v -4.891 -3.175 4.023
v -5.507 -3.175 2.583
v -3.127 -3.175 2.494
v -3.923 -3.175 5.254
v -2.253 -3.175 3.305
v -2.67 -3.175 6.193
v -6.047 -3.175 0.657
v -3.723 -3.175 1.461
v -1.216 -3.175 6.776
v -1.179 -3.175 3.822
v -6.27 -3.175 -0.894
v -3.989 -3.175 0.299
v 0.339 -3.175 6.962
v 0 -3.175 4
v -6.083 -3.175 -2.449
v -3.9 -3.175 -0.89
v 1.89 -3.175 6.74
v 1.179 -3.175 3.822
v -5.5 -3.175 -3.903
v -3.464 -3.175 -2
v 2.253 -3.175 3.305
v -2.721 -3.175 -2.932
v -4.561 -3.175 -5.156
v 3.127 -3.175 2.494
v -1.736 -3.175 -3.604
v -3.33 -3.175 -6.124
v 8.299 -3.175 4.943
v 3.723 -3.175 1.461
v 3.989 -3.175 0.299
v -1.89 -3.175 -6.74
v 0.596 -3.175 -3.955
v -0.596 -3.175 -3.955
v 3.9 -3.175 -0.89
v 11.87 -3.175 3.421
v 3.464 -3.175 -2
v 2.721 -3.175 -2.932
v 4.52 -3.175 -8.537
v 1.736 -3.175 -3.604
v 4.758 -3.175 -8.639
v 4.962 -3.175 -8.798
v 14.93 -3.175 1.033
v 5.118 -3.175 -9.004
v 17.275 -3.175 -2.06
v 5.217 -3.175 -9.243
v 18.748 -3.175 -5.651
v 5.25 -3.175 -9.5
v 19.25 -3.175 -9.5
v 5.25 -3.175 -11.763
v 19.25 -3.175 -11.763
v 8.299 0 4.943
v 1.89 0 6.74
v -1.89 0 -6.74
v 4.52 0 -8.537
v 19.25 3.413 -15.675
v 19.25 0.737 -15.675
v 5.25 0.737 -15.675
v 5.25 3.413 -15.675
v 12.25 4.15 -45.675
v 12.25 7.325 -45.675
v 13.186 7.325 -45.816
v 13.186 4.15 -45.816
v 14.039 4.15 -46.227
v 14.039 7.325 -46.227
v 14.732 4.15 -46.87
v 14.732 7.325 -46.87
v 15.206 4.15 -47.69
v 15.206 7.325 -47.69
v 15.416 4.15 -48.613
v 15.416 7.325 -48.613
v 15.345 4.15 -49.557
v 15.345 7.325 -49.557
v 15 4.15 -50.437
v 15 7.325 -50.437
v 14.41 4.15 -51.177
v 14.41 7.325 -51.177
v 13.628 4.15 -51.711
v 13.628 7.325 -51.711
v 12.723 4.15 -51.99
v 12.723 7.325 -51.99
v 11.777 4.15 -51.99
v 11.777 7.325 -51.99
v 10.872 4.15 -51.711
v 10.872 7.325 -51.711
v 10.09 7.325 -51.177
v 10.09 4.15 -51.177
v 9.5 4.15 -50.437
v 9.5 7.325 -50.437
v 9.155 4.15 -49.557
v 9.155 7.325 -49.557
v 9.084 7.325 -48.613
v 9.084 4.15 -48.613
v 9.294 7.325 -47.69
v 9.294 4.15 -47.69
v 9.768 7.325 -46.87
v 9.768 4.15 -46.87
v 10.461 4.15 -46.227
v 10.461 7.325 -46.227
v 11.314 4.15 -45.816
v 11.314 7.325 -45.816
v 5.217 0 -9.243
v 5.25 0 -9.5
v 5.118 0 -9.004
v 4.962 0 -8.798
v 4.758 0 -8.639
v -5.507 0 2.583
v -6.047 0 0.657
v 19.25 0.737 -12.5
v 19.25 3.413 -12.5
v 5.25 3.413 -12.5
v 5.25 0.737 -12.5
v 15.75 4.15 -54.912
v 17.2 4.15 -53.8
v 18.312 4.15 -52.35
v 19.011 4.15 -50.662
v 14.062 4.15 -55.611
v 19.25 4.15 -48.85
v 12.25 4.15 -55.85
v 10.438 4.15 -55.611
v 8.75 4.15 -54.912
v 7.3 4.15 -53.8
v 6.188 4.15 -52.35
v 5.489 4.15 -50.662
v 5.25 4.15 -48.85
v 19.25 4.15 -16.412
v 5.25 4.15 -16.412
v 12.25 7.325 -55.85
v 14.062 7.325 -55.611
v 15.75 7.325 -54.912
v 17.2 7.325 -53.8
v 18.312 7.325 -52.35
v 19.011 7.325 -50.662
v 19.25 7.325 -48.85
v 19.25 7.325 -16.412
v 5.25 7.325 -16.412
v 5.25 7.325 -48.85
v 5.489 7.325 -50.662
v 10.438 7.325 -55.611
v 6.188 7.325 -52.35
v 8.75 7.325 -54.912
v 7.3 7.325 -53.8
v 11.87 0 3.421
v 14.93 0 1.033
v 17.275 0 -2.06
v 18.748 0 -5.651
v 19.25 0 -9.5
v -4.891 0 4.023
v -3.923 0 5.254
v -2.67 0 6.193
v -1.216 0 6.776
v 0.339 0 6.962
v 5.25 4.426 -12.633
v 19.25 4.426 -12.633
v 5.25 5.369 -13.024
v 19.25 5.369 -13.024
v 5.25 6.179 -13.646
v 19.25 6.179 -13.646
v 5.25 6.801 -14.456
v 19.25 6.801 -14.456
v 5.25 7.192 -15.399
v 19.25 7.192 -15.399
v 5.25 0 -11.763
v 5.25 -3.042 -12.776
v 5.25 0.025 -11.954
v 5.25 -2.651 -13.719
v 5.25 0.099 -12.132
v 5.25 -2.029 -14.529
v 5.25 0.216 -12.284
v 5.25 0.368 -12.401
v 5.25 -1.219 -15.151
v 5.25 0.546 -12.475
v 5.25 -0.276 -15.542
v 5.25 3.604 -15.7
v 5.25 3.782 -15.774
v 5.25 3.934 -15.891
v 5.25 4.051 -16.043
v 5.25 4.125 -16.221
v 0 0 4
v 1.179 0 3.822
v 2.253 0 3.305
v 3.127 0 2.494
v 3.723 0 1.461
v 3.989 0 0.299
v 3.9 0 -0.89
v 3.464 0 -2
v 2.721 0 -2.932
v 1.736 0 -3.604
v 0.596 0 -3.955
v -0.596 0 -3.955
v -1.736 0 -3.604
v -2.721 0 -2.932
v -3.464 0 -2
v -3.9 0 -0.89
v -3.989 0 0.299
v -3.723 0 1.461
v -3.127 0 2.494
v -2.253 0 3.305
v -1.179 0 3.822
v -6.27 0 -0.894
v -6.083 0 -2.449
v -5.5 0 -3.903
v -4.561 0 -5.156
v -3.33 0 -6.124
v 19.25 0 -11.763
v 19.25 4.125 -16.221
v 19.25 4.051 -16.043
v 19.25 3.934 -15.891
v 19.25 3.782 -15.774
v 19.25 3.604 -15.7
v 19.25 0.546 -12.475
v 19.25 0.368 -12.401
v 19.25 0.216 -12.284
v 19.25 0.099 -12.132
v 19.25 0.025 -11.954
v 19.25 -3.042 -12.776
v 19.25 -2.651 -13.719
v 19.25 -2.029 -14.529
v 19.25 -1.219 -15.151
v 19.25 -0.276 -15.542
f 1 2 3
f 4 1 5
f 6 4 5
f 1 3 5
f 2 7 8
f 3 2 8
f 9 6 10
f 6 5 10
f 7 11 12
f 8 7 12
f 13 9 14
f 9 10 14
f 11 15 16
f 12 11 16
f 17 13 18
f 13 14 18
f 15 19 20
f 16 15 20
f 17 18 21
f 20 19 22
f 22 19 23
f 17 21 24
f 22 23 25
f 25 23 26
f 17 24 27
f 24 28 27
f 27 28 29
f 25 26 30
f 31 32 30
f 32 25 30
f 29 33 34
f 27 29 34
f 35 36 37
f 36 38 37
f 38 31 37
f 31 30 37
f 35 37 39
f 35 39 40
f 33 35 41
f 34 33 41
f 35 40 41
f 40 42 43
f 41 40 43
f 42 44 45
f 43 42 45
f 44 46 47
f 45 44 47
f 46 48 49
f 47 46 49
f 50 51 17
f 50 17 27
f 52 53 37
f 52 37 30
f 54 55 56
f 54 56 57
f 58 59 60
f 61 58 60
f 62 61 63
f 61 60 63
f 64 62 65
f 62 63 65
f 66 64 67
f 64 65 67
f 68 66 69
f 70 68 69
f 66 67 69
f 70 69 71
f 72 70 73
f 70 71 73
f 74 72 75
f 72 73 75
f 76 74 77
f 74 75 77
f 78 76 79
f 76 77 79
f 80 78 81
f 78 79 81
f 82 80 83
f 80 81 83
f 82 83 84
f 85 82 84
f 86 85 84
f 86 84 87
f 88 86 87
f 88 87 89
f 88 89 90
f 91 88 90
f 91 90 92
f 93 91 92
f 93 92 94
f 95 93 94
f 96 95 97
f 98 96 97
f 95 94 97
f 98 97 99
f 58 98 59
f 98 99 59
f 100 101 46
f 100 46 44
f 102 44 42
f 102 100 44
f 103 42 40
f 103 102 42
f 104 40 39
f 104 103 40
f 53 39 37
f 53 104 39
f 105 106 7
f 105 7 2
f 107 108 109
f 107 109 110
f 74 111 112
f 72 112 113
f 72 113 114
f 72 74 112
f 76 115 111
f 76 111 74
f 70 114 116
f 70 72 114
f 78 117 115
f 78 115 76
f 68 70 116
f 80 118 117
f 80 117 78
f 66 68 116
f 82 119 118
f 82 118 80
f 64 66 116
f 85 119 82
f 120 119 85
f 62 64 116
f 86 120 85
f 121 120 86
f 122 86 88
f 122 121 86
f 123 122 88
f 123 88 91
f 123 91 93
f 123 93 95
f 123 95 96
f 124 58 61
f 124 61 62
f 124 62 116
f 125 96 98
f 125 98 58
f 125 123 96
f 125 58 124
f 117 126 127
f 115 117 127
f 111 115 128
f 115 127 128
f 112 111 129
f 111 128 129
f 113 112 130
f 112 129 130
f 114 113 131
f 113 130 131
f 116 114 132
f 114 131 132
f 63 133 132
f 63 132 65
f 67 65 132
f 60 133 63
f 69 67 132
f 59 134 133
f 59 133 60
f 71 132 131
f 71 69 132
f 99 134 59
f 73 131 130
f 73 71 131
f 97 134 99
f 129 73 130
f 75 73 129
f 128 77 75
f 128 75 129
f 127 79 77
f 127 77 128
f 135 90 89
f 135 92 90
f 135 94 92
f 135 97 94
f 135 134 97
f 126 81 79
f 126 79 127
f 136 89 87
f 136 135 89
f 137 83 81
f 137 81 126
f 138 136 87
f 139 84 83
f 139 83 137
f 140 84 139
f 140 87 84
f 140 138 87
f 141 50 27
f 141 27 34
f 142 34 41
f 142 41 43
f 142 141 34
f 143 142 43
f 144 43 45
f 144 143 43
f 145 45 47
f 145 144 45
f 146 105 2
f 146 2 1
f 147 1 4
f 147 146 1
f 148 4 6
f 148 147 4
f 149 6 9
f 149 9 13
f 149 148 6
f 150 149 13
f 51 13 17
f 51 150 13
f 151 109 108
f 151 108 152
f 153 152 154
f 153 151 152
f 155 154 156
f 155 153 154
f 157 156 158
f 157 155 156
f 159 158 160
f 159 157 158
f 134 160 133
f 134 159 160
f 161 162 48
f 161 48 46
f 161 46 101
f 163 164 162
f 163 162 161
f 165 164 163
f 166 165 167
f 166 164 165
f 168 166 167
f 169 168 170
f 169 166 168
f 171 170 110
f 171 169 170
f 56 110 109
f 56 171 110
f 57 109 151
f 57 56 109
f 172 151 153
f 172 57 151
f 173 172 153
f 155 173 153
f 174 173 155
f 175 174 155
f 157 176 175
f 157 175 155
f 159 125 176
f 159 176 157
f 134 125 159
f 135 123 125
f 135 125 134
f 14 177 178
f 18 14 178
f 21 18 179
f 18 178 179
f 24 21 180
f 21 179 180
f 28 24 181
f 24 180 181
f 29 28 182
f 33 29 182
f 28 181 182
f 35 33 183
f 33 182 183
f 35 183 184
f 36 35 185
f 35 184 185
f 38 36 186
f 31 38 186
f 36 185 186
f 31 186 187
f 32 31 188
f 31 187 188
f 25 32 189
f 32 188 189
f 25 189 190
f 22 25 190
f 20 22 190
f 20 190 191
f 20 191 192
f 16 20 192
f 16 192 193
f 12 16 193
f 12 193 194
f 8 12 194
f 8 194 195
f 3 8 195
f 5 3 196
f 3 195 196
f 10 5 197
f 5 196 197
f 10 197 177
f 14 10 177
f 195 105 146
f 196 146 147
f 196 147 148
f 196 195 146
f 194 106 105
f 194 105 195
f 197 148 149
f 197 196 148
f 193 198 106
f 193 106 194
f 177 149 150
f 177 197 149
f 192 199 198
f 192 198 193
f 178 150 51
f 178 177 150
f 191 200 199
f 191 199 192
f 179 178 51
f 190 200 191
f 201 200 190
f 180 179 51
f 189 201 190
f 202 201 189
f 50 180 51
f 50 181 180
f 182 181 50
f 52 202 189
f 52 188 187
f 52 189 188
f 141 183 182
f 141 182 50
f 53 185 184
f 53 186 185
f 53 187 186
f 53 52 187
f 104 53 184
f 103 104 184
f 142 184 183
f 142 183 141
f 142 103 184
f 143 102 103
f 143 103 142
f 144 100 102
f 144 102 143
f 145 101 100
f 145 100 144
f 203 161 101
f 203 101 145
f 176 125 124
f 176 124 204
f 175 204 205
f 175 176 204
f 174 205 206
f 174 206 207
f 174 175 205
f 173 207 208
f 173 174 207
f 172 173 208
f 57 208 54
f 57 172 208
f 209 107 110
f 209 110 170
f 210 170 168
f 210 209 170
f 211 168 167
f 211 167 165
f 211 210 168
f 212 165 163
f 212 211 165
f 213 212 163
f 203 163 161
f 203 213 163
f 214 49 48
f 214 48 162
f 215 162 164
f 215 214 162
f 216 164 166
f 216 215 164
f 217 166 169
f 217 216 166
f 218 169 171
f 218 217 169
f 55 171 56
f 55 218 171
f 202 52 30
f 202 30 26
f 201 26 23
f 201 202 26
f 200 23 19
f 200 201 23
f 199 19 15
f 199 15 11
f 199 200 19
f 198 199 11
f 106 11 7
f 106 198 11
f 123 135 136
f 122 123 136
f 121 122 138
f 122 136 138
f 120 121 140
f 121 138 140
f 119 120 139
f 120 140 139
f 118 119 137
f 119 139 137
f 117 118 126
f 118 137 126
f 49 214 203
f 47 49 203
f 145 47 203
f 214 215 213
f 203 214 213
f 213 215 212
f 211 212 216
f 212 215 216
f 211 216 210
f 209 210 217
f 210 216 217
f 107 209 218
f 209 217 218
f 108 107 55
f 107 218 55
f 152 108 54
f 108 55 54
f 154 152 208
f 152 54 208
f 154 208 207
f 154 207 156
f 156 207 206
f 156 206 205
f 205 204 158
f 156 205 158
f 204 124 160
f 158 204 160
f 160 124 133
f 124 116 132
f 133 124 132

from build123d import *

# Parameters (mm, degrees)
SKETCH1_R                    = 4
BASE_FLANGE1_DEPTH           = 3.175
EDGE_FLANGE1_STRIP_W         = 14.1732
EDGE_FLANGE1_STRIP_H         = 3.175
EDGE_FLANGE1_STRIP_CUT_DEPTH = 14
EDGE_FLANGE1_DEPTH           = 14
EDGE_FLANGE2_STRIP_W         = 14.1732
EDGE_FLANGE2_STRIP_H         = 3.175
EDGE_FLANGE2_STRIP_CUT_DEPTH = 14
EDGE_FLANGE2_DEPTH           = 14
SKETCH17_R                   = 3.175
CUT_EXTRUDE1_DEPTH           = 3.175


# Sheet-metal steps are written as plain solids
with BuildPart() as part:
    # Sketch1 → Base-Flange1 (new body)
    with BuildSketch(Plane(origin=(0, 0, 0), x_dir=(1, 0, 0), z_dir=(0, 1, 0))):
        with BuildLine():
            Line((19.250001318, 12.5), (5.250001318, 12.5))
            Line((5.250001318, 12.5), (5.250001318, 9.5))
            ThreePointArc((5.250001318, 9.5), (5.046855339, 8.895828112), (4.519953978, 8.537126404))
            Line((4.519953978, 8.537126404), (-1.889668619, 6.740115171))
            ThreePointArc((-1.889668619, 6.740115171), (-5.500391492, 3.902688152), (-6.047194235, -0.656842363))
            Line((-6.047194235, -0.656842363), (-5.507288915, -2.582589555))
            ThreePointArc((-5.507288915, -2.582589555), (-2.669861896, -6.193312428), (1.889668619, -6.740115171))
            Line((1.889668619, -6.740115171), (8.299291215, -4.943103937))
            ThreePointArc((8.299291215, -4.943103937), (16.202811625, 0.437421682), (19.250001318, 9.5))
            Line((19.250001318, 9.5), (19.250001318, 12.5))
        make_face()
        with Locations(Location((0, 0, 0), (0, 0, 270))):
            Circle(SKETCH1_R, mode=Mode.SUBTRACT)
    extrude(amount=-BASE_FLANGE1_DEPTH)

    # Edge-Flange1 strip (across the edge) → Edge-Flange1 strip cut (cut)
    with BuildSketch(Plane(origin=(19.250001318, 0, -12.5), x_dir=(0, 0, 1), z_dir=(-1, 0, 0))):
        with Locations((-6.35, -1.5875)):
            Rectangle(EDGE_FLANGE1_STRIP_W, EDGE_FLANGE1_STRIP_H)
    extrude(amount=EDGE_FLANGE1_STRIP_CUT_DEPTH, mode=Mode.SUBTRACT)

    # Edge-Flange1 section (across the edge) → Edge-Flange1 (add)
    with BuildSketch(Plane(origin=(19.250001318, 0, -12.5), x_dir=(0, 0, 1), z_dir=(-1, 0, 0))):
        with BuildLine():
            Line((-3.175, 0.7366), (-3.175, 7.324994814))
            Line((-3.175, 7.324994814), (0, 7.324994814))
            Line((0, 7.324994814), (0, 0.7366))
            ThreePointArc((0, 0.7366), (0.215745145, 0.215745145), (0.7366, 0))
            Line((0.7366, 0), (0.7366, -3.175))
            ThreePointArc((0.7366, -3.175), (-2.029318885, -2.029318885), (-3.175, 0.7366))
        make_face()
    extrude(amount=EDGE_FLANGE1_DEPTH)

    # Edge-Flange2 strip (across the edge) → Edge-Flange2 strip cut (cut)
    with BuildSketch(Plane(origin=(5.250001318, 7.324994814, -15.675), x_dir=(0, -1, 0), z_dir=(1, 0, 0))):
        with Locations((-3.175, -1.5875)):
            Rectangle(EDGE_FLANGE2_STRIP_W, EDGE_FLANGE2_STRIP_H)
    extrude(amount=EDGE_FLANGE2_STRIP_CUT_DEPTH, mode=Mode.SUBTRACT)

    # Edge-Flange2 section (across the edge) → Edge-Flange2 (add)
    with BuildSketch(Plane(origin=(5.250001318, 7.324994814, -15.675), x_dir=(0, -1, 0), z_dir=(1, 0, 0))):
        with BuildLine():
            Line((0, 0.7366), (0, 40.174998631))
            Line((0, 40.174998631), (3.175, 40.174998631))
            Line((3.175, 40.174998631), (3.175, 0.7366))
            ThreePointArc((3.175, 0.7366), (3.390745145, 0.215745145), (3.9116, 0))
            Line((3.9116, 0), (3.9116, -3.175))
            ThreePointArc((3.9116, -3.175), (1.145681115, -2.029318885), (0, 0.7366))
        make_face()
    extrude(amount=EDGE_FLANGE2_DEPTH)

    # Sketch17 → Cut-Extrude1 (cut)
    with BuildSketch(Plane(origin=(0, 7.324994814, 0), x_dir=(1, 0, 0), z_dir=(0, 1, 0))):
        with BuildLine():
            ThreePointArc((5.250001318, 48.849998631), (7.30025385, 53.7997461), (12.250001318, 55.849998631))
            Line((12.250001318, 55.849998631), (5.250001318, 55.849998631))
            Line((5.250001318, 55.849998631), (5.250001318, 48.849998631))
        make_face()
        with BuildLine():
            ThreePointArc((12.250001318, 55.849998631), (17.199748787, 53.7997461), (19.250001318, 48.849998631))
            Line((19.250001318, 48.849998631), (19.250001318, 55.849998631))
            Line((19.250001318, 55.849998631), (12.250001318, 55.849998631))
        make_face()
        with Locations(Location((12.250001318, 48.849998631, 0), (0, 0, 270))):
            Circle(SKETCH17_R)
    extrude(amount=-CUT_EXTRUDE1_DEPTH, mode=Mode.SUBTRACT)


solid = part.part
